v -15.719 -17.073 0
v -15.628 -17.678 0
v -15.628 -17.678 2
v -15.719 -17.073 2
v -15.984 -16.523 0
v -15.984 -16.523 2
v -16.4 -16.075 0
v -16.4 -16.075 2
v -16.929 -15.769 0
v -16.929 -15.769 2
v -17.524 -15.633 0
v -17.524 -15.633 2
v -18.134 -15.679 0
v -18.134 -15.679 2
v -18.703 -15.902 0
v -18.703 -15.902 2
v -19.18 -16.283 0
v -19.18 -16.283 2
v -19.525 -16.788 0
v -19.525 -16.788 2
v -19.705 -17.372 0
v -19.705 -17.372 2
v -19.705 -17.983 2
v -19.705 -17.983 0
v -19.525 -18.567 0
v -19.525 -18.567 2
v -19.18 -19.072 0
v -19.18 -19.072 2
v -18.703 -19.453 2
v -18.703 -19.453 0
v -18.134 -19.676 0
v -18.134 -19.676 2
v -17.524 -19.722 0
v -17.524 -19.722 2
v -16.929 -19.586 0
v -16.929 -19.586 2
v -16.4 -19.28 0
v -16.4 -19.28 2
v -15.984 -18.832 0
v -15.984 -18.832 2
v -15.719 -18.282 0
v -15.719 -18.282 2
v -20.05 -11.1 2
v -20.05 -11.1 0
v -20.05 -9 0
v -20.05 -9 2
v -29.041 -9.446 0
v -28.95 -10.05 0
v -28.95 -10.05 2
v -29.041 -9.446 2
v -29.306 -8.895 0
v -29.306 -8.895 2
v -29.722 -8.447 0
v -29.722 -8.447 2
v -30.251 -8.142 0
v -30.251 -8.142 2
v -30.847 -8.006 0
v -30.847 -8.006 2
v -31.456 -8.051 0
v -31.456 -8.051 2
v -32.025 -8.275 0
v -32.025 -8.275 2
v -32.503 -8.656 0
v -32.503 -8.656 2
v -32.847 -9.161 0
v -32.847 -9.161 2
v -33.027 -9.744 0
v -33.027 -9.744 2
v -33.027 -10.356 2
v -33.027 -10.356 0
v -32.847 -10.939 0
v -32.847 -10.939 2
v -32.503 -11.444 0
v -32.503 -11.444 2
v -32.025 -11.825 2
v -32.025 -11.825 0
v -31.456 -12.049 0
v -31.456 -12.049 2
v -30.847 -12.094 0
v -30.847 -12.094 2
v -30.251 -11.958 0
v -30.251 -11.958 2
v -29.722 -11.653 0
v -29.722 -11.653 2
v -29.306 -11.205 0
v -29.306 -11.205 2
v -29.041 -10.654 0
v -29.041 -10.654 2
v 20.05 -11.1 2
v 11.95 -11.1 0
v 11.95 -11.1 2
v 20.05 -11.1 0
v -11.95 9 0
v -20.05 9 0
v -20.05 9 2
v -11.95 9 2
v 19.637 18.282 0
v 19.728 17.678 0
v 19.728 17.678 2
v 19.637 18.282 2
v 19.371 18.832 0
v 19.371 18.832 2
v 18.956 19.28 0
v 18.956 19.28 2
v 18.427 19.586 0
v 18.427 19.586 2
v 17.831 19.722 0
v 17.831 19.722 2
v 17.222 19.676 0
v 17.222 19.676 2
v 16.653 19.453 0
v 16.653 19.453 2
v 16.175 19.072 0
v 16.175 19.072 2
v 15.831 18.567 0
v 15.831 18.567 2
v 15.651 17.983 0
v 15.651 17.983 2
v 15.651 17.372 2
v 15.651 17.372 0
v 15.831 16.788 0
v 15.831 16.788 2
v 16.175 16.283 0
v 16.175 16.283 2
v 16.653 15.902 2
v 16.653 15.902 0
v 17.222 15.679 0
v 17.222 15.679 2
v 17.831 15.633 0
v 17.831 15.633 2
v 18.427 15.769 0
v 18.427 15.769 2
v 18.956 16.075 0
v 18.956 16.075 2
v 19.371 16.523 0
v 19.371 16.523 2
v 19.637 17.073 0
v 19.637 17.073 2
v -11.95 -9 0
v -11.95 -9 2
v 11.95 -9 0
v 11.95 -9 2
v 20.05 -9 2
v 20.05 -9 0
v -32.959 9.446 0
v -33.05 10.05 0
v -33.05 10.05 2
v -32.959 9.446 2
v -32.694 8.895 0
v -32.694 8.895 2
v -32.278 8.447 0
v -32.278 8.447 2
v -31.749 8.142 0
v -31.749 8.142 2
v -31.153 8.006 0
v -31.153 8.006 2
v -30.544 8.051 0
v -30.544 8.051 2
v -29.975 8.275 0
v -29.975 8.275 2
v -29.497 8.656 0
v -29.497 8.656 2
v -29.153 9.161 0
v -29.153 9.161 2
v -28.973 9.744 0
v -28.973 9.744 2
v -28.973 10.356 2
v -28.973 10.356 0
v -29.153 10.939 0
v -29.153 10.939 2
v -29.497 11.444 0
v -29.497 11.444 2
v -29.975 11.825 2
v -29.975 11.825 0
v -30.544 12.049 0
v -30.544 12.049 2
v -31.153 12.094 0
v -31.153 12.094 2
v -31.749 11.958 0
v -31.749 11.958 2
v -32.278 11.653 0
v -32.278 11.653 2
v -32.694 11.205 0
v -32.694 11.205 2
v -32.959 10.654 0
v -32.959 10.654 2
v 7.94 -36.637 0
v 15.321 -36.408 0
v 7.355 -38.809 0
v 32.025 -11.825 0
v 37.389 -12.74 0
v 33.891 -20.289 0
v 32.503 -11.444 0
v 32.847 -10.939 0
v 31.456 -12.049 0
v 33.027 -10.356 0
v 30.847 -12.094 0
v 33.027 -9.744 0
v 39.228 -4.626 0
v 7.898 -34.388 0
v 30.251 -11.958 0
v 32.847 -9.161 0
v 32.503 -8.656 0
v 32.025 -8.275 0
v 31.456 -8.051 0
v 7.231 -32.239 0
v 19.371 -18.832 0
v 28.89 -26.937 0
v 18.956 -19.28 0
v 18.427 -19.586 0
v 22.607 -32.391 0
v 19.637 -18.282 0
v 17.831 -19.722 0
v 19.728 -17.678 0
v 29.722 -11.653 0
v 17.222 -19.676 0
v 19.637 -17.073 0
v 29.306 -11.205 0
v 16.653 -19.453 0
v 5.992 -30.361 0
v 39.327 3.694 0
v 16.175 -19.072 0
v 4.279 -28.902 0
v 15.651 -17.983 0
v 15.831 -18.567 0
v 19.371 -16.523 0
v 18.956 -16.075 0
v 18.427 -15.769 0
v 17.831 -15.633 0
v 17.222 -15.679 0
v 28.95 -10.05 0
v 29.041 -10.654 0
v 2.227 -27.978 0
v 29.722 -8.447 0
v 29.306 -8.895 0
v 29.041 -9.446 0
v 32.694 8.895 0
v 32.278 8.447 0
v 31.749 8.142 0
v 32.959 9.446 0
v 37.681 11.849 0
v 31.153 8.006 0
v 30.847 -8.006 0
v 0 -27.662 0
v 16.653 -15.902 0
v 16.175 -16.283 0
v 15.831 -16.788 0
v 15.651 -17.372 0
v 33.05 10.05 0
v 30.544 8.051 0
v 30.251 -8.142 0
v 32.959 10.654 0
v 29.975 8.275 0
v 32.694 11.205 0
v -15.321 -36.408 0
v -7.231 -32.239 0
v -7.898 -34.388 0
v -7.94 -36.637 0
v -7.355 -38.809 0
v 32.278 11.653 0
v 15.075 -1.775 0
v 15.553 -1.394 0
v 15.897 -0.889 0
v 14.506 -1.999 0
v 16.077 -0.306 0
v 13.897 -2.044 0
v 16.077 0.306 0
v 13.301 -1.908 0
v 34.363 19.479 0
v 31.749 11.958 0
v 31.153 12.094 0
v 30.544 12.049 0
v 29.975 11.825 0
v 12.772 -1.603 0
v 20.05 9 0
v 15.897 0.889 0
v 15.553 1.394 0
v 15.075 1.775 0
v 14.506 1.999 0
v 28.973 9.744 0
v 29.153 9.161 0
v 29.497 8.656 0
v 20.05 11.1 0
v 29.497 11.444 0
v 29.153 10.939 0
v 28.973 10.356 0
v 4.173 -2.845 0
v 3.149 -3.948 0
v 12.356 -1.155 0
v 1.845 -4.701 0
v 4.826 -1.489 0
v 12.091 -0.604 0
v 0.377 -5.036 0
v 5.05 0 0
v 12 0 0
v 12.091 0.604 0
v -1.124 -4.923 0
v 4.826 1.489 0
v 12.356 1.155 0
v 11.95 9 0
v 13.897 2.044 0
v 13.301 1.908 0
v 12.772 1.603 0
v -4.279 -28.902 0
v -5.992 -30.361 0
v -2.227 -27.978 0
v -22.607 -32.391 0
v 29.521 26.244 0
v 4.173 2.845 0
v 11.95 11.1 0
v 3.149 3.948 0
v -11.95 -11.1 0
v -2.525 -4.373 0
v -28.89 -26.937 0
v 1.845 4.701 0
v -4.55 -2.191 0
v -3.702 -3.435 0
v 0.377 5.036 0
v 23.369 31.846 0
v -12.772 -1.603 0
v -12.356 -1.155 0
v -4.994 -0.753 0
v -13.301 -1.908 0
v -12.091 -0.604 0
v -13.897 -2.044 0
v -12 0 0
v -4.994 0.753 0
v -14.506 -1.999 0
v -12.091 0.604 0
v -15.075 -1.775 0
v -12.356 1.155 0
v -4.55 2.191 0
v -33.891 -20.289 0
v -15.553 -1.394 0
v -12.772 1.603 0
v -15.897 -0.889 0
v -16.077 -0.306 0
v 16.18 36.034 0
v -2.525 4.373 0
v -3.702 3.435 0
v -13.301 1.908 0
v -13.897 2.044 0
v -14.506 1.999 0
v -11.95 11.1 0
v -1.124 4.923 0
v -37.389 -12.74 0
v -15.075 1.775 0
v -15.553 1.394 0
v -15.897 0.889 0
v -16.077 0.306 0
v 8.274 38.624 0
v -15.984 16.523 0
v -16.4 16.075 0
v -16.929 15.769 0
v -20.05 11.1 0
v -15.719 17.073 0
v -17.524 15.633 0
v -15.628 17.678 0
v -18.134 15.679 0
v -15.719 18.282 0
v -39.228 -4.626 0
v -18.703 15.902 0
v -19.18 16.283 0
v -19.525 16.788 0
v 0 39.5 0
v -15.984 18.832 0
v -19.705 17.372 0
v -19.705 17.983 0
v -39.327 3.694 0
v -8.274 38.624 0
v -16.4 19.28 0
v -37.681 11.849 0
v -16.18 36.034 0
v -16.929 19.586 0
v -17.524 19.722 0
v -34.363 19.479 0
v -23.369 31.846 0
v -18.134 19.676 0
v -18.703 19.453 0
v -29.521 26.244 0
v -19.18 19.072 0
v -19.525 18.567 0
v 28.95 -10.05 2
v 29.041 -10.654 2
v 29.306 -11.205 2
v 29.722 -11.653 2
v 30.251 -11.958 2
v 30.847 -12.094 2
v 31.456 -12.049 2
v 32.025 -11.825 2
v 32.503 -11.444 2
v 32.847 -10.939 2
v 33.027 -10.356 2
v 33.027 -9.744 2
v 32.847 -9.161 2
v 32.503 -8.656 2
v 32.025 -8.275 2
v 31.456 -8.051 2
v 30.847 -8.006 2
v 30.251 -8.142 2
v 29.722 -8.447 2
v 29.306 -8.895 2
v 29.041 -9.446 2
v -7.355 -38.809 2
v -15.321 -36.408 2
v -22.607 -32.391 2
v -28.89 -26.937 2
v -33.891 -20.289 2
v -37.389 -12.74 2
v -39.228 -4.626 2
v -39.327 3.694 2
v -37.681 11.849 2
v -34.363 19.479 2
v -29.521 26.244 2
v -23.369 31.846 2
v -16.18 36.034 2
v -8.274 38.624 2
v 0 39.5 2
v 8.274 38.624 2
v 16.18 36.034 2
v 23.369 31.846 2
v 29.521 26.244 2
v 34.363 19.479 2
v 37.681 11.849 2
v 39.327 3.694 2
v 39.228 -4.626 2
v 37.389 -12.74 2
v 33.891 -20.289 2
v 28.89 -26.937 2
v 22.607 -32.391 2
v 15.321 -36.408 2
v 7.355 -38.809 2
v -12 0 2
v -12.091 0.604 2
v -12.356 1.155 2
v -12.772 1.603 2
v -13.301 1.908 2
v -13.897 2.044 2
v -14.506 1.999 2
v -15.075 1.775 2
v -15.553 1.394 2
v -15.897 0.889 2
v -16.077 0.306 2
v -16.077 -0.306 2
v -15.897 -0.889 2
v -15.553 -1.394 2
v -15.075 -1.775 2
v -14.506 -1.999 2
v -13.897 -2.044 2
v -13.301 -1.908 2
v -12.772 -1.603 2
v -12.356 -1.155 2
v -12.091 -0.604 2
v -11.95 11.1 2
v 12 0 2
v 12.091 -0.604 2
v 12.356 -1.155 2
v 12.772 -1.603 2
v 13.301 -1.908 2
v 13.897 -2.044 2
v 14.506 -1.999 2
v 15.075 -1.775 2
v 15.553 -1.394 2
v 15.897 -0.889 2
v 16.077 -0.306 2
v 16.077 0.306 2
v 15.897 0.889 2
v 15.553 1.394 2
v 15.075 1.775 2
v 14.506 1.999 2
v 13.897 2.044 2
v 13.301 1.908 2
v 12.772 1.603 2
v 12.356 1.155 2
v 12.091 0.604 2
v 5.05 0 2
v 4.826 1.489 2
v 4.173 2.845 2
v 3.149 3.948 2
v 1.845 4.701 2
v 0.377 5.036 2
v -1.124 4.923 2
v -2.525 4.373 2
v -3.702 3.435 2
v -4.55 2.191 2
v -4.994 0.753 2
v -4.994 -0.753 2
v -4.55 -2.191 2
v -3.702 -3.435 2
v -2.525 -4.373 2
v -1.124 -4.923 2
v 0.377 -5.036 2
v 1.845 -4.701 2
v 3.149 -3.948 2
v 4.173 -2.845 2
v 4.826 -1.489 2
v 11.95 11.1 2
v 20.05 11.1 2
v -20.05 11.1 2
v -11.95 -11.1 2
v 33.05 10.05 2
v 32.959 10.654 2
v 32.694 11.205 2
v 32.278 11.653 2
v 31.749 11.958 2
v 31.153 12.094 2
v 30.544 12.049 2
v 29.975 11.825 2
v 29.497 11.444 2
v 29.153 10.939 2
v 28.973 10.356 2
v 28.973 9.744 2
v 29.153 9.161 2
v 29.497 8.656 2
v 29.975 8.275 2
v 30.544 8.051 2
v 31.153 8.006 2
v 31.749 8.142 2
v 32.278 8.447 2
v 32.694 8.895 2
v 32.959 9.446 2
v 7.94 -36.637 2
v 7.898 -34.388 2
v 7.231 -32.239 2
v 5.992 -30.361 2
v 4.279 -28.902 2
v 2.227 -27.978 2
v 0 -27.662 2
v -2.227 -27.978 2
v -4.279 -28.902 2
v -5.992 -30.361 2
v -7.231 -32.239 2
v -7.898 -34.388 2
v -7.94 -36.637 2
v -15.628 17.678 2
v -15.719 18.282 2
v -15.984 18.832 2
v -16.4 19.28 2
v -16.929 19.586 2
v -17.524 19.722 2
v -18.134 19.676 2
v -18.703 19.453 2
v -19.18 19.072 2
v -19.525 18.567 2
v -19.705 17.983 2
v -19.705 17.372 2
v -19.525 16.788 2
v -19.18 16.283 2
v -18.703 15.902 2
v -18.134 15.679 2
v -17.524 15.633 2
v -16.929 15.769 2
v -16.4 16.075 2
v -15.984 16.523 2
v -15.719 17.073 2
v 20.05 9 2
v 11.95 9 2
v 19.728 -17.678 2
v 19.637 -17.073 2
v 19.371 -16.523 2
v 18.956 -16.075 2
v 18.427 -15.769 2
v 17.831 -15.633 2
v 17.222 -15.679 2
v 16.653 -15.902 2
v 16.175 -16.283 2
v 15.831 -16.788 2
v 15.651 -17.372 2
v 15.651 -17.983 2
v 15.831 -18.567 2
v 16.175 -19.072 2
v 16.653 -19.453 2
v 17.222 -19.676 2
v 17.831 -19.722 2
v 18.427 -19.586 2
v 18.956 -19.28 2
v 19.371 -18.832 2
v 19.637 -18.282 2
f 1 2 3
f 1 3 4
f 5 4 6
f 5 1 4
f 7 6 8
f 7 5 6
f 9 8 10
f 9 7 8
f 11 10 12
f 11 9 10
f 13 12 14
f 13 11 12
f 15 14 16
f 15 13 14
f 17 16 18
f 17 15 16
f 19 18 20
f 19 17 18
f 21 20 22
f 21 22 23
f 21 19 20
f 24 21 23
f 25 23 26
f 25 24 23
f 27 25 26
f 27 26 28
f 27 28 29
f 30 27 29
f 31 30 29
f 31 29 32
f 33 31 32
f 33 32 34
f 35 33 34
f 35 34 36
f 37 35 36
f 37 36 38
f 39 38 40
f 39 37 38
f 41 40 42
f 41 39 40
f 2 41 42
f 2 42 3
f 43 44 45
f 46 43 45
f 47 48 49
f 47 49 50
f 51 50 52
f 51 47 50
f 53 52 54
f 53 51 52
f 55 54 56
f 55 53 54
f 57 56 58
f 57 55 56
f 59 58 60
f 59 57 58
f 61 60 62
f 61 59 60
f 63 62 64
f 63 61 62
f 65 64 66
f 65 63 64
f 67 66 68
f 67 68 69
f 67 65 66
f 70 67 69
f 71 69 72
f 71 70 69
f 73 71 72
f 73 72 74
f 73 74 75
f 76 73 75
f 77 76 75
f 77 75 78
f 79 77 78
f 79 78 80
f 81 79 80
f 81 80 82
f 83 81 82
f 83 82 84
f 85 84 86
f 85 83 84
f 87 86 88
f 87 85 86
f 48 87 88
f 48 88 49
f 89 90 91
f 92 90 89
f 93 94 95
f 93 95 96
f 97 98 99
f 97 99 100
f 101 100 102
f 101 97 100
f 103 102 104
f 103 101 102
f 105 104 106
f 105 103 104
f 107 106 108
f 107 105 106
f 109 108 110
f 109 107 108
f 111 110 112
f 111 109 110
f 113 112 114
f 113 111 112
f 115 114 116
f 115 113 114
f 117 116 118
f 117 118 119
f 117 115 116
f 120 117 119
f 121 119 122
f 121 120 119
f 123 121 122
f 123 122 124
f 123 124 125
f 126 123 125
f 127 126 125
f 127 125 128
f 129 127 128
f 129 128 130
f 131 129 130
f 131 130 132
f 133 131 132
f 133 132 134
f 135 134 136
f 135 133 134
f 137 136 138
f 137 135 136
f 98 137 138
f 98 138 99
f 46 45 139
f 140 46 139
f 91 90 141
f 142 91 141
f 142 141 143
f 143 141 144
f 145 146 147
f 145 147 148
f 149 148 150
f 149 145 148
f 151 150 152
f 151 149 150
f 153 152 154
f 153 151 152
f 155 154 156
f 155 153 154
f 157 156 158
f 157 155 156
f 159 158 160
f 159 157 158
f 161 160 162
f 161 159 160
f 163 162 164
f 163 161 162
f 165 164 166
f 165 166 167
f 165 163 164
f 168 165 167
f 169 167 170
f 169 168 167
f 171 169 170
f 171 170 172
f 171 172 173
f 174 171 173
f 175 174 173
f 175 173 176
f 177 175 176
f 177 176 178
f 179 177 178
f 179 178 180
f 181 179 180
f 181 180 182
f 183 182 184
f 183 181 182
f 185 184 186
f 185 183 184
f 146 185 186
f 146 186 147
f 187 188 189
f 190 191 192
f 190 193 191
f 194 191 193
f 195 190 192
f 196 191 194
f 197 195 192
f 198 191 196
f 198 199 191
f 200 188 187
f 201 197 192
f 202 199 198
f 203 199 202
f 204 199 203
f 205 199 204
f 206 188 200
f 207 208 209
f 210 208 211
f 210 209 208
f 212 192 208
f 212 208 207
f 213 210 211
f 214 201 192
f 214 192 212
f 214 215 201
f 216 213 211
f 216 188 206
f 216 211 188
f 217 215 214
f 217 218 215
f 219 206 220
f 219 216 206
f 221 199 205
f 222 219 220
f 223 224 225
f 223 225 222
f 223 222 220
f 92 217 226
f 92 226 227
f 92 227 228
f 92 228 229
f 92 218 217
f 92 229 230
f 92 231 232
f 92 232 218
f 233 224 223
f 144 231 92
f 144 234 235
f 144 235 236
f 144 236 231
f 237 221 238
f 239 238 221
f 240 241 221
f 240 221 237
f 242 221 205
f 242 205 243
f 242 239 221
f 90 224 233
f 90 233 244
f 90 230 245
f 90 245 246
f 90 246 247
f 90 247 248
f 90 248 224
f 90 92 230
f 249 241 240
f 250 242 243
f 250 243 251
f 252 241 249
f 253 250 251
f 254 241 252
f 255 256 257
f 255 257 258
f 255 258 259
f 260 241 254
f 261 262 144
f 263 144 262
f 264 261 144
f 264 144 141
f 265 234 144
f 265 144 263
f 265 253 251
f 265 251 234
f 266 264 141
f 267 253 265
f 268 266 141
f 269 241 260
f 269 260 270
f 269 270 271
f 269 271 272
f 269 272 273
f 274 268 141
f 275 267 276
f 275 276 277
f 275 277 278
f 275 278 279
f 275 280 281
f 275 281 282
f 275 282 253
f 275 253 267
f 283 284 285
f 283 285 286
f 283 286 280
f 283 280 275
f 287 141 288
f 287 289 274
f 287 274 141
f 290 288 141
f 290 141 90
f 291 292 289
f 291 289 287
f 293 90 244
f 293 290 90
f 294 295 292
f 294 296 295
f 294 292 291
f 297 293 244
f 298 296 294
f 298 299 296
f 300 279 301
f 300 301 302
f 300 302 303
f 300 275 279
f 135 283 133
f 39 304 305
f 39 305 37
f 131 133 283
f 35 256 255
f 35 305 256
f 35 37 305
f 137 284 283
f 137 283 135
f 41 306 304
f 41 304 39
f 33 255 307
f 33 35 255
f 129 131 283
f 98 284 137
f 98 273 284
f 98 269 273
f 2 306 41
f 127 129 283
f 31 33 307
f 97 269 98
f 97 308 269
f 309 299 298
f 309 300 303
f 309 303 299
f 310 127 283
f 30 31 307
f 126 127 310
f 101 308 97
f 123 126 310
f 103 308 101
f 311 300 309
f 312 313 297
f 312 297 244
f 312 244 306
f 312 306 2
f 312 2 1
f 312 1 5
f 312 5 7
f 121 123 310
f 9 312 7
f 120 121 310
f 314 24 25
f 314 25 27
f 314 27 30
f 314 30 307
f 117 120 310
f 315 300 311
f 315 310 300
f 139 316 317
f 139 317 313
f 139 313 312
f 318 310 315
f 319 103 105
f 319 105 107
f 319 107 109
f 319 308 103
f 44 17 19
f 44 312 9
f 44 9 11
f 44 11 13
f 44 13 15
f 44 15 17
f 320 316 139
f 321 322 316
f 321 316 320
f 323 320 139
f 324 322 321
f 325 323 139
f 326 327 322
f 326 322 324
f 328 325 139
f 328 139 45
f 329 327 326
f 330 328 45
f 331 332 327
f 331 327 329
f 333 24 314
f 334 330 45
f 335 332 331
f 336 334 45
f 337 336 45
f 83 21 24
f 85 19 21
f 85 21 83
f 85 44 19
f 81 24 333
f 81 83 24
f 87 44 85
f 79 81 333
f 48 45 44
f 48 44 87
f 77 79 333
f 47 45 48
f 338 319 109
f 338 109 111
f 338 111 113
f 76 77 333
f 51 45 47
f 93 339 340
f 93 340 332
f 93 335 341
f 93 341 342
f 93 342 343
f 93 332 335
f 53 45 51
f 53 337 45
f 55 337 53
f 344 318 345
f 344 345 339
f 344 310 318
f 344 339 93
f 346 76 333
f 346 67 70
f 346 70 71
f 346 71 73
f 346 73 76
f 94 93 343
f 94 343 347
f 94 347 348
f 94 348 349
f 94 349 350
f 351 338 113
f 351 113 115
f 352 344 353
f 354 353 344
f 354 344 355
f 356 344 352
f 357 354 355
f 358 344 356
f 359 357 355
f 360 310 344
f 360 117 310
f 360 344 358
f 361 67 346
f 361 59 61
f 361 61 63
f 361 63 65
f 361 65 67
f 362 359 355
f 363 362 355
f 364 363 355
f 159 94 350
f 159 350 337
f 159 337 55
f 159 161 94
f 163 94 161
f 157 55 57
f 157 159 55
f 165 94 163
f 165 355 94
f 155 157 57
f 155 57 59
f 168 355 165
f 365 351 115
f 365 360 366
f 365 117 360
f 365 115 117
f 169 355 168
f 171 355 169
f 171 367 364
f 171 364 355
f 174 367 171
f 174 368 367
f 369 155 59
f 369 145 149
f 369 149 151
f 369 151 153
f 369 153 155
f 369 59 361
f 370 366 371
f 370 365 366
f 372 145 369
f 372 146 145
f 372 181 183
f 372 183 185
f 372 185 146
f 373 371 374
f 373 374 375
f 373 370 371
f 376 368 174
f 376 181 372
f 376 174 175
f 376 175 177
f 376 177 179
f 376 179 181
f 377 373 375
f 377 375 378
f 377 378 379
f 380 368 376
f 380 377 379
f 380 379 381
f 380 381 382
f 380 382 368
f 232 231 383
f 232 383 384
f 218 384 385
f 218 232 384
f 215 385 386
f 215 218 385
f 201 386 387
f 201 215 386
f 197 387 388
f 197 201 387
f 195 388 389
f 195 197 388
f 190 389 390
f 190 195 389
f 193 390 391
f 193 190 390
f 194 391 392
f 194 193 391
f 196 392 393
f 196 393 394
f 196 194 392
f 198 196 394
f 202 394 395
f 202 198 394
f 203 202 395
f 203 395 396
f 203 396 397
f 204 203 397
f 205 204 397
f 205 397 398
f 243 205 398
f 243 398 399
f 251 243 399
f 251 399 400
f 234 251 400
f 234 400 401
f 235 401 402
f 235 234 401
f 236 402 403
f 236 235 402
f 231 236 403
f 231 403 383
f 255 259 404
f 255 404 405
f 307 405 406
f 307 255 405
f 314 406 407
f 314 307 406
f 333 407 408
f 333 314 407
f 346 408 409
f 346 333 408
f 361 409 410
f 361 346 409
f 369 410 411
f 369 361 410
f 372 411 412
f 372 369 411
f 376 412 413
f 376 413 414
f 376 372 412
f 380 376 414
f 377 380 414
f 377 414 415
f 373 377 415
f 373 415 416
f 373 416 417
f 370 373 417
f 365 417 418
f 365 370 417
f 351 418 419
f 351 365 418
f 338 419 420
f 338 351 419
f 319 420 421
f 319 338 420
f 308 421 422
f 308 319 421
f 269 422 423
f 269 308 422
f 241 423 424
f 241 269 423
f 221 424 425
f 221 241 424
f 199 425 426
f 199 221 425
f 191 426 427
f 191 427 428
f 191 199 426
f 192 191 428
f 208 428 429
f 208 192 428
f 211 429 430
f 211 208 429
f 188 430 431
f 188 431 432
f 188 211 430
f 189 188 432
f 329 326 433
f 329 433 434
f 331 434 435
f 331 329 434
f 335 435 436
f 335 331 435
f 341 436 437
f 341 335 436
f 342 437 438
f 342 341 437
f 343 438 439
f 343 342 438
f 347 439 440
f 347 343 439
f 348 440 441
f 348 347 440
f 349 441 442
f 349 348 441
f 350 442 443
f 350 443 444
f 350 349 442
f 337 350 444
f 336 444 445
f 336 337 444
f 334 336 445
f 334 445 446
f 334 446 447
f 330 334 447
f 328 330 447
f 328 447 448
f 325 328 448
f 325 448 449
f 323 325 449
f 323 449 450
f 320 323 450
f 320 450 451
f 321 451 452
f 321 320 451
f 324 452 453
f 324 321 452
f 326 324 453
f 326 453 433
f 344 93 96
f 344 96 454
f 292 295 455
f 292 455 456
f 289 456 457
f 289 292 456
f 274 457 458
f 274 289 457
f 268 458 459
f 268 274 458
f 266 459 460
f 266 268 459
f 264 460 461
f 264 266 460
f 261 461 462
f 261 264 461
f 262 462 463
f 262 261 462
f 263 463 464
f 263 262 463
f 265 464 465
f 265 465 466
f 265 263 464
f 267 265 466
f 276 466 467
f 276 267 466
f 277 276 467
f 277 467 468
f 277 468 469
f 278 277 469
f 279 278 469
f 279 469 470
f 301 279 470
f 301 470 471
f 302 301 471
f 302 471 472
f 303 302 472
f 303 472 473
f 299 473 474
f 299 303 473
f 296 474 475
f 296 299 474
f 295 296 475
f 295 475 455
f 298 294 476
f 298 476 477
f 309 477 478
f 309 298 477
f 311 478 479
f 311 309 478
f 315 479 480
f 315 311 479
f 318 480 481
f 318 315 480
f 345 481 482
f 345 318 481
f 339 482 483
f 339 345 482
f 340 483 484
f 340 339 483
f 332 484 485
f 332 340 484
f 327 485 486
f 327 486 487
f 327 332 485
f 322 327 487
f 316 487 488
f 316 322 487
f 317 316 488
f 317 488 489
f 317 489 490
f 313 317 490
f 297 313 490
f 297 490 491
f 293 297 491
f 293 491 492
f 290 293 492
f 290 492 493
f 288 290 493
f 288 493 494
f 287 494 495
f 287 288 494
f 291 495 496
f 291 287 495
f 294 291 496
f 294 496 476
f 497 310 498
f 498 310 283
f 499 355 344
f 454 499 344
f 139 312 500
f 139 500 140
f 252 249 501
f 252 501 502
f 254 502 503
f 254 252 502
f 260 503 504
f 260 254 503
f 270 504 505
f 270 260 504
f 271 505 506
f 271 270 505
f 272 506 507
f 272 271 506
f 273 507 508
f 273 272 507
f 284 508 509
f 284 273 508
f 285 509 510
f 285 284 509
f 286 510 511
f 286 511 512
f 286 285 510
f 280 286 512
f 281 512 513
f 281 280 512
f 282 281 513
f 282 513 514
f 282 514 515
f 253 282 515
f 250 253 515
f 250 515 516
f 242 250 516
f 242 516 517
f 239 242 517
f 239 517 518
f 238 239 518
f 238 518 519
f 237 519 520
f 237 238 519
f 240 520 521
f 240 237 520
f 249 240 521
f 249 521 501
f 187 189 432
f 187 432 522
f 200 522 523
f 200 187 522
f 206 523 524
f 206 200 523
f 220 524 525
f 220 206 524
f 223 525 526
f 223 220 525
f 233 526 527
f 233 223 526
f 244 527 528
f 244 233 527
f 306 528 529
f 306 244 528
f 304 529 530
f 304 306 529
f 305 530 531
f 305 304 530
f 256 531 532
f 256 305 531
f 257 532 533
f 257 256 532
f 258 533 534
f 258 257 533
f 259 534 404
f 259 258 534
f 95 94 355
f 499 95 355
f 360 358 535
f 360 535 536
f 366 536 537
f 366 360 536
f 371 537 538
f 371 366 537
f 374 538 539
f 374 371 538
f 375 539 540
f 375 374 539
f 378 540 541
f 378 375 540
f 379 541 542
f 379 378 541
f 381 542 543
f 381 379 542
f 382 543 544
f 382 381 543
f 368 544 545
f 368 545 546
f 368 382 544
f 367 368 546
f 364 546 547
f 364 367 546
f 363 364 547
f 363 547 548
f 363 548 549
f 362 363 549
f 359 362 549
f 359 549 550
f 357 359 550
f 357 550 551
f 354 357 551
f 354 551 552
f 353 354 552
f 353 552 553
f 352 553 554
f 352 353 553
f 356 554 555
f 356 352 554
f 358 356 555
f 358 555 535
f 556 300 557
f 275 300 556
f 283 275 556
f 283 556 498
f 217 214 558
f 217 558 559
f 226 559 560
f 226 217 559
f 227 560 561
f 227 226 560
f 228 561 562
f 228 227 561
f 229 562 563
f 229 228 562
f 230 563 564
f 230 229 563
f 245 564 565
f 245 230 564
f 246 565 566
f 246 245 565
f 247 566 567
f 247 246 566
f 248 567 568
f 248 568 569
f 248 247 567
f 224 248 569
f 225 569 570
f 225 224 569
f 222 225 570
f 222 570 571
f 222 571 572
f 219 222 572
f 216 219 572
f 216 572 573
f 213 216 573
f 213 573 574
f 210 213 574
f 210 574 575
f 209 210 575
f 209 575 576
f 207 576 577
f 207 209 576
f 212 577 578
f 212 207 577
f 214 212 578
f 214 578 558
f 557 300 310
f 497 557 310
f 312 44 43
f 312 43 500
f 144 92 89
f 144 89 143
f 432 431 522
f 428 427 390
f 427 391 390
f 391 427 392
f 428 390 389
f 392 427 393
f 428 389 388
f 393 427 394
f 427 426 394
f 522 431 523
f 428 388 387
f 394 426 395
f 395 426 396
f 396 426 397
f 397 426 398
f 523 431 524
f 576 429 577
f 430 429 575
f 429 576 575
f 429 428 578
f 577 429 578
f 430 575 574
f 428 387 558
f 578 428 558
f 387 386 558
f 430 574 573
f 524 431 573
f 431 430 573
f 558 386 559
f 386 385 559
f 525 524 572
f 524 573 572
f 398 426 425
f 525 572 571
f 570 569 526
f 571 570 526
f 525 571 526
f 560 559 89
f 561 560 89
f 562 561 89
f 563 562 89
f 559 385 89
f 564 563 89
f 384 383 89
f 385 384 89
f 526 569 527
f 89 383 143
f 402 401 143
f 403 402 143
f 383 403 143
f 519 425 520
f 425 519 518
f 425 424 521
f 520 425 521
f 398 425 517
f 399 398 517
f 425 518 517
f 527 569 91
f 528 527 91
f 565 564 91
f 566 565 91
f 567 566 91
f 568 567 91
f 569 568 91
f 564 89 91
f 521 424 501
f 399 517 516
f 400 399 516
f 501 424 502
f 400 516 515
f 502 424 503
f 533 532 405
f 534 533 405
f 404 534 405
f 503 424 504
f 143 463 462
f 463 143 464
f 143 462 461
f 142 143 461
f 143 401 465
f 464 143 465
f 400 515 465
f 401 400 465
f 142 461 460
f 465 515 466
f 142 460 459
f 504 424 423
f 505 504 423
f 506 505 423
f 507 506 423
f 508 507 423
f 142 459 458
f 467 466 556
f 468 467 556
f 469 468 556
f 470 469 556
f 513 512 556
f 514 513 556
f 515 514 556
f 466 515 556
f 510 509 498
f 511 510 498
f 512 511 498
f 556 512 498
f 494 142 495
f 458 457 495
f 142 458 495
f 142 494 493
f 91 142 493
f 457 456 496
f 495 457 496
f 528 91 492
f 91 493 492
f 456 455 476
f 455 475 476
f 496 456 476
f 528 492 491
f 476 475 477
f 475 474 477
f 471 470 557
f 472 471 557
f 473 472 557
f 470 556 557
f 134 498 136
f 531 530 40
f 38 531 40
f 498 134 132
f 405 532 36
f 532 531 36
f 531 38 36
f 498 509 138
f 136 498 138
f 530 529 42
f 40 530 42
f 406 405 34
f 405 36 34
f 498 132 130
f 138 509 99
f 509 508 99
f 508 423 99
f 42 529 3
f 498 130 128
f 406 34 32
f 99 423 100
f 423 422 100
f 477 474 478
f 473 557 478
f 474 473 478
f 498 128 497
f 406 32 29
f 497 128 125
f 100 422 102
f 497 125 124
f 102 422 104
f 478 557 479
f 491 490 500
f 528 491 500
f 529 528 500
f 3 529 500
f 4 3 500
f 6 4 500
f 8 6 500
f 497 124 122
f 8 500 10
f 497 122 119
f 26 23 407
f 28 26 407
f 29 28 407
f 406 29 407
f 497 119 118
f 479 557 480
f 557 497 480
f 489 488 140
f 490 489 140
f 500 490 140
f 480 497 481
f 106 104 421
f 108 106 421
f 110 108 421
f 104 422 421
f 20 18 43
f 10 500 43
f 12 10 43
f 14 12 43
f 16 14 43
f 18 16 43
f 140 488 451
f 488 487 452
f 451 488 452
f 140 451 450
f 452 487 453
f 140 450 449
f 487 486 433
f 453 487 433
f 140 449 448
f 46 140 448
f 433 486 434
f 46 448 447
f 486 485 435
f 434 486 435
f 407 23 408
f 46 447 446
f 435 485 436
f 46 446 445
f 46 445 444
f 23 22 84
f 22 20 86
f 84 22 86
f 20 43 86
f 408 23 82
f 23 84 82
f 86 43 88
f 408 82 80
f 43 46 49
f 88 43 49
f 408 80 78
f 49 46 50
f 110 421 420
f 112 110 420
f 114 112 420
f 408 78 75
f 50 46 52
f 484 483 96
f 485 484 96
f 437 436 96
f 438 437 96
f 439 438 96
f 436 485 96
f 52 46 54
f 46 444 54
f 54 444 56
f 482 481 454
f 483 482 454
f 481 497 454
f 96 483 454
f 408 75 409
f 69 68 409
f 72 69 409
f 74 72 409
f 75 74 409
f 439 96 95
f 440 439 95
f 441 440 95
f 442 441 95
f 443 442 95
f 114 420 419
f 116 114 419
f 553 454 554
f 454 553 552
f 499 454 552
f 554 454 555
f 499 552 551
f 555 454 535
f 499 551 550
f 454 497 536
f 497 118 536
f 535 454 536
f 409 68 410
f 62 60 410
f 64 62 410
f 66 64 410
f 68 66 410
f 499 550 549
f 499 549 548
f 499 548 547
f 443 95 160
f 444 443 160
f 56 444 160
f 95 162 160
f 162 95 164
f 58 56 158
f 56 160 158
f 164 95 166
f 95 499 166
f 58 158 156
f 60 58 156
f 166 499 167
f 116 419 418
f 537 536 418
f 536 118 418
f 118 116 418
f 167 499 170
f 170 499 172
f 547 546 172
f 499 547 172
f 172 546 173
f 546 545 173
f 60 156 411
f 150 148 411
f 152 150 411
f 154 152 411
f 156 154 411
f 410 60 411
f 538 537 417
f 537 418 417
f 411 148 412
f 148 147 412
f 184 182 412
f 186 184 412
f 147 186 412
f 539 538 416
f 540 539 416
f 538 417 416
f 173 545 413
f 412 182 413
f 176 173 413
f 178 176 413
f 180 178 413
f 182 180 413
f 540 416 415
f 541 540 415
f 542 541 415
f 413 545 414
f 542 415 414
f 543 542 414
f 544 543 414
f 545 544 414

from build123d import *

# Parameters (mm, degrees)
SKETCH_1_R      = 5.05
SKETCH_1_R_2    = 2.05
SKETCH_1_W      = 8.1
SKETCH_1_H      = 2.1
EXTRUDE_1_DEPTH = 2


with BuildPart() as part:
    # 草图1 → 凸台-拉伸1 (new body)
    with BuildSketch(Plane.XY):
        with BuildLine():
            ThreePointArc((-7.35497191, -38.809204942), (0, 39.5), (7.35497191, -38.809204942))
            ThreePointArc((7.35497191, -38.809204942), (0, -27.662081143), (-7.35497191, -38.809204942))
        make_face()
        Circle(SKETCH_1_R, mode=Mode.SUBTRACT)
        with Locations((-17.67766953, -17.67766953)):
            Circle(SKETCH_1_R_2, mode=Mode.SUBTRACT)
        with Locations((-17.67766953, 17.67766953)):
            Circle(SKETCH_1_R_2, mode=Mode.SUBTRACT)
        with Locations((17.67766953, 17.67766953)):
            Circle(SKETCH_1_R_2, mode=Mode.SUBTRACT)
        with Locations((17.67766953, -17.67766953)):
            Circle(SKETCH_1_R_2, mode=Mode.SUBTRACT)
        with Locations((31, 10.05)):
            Circle(SKETCH_1_R_2, mode=Mode.SUBTRACT)
        with Locations(Location((31, -10.05, 0), (0, 0, 180))):
            Circle(SKETCH_1_R_2, mode=Mode.SUBTRACT)
        with Locations((-31, -10.05)):
            Circle(SKETCH_1_R_2, mode=Mode.SUBTRACT)
        with Locations(Location((-31, 10.05, 0), (0, 0, 180))):
            Circle(SKETCH_1_R_2, mode=Mode.SUBTRACT)
        with Locations((-14.05, 0)):
            Circle(SKETCH_1_R_2, mode=Mode.SUBTRACT)
        with Locations(Location((14.05, 0, 0), (0, 0, 180))):
            Circle(SKETCH_1_R_2, mode=Mode.SUBTRACT)
        with Locations((16, -10.05)):
            Rectangle(SKETCH_1_W, SKETCH_1_H, mode=Mode.SUBTRACT)
        with Locations((16, 10.05)):
            Rectangle(SKETCH_1_W, SKETCH_1_H, mode=Mode.SUBTRACT)
        with Locations((-16, 10.05)):
            Rectangle(SKETCH_1_W, SKETCH_1_H, mode=Mode.SUBTRACT)
        with Locations((-16, -10.05)):
            Rectangle(SKETCH_1_W, SKETCH_1_H, mode=Mode.SUBTRACT)
    extrude(amount=EXTRUDE_1_DEPTH)


solid = part.part
